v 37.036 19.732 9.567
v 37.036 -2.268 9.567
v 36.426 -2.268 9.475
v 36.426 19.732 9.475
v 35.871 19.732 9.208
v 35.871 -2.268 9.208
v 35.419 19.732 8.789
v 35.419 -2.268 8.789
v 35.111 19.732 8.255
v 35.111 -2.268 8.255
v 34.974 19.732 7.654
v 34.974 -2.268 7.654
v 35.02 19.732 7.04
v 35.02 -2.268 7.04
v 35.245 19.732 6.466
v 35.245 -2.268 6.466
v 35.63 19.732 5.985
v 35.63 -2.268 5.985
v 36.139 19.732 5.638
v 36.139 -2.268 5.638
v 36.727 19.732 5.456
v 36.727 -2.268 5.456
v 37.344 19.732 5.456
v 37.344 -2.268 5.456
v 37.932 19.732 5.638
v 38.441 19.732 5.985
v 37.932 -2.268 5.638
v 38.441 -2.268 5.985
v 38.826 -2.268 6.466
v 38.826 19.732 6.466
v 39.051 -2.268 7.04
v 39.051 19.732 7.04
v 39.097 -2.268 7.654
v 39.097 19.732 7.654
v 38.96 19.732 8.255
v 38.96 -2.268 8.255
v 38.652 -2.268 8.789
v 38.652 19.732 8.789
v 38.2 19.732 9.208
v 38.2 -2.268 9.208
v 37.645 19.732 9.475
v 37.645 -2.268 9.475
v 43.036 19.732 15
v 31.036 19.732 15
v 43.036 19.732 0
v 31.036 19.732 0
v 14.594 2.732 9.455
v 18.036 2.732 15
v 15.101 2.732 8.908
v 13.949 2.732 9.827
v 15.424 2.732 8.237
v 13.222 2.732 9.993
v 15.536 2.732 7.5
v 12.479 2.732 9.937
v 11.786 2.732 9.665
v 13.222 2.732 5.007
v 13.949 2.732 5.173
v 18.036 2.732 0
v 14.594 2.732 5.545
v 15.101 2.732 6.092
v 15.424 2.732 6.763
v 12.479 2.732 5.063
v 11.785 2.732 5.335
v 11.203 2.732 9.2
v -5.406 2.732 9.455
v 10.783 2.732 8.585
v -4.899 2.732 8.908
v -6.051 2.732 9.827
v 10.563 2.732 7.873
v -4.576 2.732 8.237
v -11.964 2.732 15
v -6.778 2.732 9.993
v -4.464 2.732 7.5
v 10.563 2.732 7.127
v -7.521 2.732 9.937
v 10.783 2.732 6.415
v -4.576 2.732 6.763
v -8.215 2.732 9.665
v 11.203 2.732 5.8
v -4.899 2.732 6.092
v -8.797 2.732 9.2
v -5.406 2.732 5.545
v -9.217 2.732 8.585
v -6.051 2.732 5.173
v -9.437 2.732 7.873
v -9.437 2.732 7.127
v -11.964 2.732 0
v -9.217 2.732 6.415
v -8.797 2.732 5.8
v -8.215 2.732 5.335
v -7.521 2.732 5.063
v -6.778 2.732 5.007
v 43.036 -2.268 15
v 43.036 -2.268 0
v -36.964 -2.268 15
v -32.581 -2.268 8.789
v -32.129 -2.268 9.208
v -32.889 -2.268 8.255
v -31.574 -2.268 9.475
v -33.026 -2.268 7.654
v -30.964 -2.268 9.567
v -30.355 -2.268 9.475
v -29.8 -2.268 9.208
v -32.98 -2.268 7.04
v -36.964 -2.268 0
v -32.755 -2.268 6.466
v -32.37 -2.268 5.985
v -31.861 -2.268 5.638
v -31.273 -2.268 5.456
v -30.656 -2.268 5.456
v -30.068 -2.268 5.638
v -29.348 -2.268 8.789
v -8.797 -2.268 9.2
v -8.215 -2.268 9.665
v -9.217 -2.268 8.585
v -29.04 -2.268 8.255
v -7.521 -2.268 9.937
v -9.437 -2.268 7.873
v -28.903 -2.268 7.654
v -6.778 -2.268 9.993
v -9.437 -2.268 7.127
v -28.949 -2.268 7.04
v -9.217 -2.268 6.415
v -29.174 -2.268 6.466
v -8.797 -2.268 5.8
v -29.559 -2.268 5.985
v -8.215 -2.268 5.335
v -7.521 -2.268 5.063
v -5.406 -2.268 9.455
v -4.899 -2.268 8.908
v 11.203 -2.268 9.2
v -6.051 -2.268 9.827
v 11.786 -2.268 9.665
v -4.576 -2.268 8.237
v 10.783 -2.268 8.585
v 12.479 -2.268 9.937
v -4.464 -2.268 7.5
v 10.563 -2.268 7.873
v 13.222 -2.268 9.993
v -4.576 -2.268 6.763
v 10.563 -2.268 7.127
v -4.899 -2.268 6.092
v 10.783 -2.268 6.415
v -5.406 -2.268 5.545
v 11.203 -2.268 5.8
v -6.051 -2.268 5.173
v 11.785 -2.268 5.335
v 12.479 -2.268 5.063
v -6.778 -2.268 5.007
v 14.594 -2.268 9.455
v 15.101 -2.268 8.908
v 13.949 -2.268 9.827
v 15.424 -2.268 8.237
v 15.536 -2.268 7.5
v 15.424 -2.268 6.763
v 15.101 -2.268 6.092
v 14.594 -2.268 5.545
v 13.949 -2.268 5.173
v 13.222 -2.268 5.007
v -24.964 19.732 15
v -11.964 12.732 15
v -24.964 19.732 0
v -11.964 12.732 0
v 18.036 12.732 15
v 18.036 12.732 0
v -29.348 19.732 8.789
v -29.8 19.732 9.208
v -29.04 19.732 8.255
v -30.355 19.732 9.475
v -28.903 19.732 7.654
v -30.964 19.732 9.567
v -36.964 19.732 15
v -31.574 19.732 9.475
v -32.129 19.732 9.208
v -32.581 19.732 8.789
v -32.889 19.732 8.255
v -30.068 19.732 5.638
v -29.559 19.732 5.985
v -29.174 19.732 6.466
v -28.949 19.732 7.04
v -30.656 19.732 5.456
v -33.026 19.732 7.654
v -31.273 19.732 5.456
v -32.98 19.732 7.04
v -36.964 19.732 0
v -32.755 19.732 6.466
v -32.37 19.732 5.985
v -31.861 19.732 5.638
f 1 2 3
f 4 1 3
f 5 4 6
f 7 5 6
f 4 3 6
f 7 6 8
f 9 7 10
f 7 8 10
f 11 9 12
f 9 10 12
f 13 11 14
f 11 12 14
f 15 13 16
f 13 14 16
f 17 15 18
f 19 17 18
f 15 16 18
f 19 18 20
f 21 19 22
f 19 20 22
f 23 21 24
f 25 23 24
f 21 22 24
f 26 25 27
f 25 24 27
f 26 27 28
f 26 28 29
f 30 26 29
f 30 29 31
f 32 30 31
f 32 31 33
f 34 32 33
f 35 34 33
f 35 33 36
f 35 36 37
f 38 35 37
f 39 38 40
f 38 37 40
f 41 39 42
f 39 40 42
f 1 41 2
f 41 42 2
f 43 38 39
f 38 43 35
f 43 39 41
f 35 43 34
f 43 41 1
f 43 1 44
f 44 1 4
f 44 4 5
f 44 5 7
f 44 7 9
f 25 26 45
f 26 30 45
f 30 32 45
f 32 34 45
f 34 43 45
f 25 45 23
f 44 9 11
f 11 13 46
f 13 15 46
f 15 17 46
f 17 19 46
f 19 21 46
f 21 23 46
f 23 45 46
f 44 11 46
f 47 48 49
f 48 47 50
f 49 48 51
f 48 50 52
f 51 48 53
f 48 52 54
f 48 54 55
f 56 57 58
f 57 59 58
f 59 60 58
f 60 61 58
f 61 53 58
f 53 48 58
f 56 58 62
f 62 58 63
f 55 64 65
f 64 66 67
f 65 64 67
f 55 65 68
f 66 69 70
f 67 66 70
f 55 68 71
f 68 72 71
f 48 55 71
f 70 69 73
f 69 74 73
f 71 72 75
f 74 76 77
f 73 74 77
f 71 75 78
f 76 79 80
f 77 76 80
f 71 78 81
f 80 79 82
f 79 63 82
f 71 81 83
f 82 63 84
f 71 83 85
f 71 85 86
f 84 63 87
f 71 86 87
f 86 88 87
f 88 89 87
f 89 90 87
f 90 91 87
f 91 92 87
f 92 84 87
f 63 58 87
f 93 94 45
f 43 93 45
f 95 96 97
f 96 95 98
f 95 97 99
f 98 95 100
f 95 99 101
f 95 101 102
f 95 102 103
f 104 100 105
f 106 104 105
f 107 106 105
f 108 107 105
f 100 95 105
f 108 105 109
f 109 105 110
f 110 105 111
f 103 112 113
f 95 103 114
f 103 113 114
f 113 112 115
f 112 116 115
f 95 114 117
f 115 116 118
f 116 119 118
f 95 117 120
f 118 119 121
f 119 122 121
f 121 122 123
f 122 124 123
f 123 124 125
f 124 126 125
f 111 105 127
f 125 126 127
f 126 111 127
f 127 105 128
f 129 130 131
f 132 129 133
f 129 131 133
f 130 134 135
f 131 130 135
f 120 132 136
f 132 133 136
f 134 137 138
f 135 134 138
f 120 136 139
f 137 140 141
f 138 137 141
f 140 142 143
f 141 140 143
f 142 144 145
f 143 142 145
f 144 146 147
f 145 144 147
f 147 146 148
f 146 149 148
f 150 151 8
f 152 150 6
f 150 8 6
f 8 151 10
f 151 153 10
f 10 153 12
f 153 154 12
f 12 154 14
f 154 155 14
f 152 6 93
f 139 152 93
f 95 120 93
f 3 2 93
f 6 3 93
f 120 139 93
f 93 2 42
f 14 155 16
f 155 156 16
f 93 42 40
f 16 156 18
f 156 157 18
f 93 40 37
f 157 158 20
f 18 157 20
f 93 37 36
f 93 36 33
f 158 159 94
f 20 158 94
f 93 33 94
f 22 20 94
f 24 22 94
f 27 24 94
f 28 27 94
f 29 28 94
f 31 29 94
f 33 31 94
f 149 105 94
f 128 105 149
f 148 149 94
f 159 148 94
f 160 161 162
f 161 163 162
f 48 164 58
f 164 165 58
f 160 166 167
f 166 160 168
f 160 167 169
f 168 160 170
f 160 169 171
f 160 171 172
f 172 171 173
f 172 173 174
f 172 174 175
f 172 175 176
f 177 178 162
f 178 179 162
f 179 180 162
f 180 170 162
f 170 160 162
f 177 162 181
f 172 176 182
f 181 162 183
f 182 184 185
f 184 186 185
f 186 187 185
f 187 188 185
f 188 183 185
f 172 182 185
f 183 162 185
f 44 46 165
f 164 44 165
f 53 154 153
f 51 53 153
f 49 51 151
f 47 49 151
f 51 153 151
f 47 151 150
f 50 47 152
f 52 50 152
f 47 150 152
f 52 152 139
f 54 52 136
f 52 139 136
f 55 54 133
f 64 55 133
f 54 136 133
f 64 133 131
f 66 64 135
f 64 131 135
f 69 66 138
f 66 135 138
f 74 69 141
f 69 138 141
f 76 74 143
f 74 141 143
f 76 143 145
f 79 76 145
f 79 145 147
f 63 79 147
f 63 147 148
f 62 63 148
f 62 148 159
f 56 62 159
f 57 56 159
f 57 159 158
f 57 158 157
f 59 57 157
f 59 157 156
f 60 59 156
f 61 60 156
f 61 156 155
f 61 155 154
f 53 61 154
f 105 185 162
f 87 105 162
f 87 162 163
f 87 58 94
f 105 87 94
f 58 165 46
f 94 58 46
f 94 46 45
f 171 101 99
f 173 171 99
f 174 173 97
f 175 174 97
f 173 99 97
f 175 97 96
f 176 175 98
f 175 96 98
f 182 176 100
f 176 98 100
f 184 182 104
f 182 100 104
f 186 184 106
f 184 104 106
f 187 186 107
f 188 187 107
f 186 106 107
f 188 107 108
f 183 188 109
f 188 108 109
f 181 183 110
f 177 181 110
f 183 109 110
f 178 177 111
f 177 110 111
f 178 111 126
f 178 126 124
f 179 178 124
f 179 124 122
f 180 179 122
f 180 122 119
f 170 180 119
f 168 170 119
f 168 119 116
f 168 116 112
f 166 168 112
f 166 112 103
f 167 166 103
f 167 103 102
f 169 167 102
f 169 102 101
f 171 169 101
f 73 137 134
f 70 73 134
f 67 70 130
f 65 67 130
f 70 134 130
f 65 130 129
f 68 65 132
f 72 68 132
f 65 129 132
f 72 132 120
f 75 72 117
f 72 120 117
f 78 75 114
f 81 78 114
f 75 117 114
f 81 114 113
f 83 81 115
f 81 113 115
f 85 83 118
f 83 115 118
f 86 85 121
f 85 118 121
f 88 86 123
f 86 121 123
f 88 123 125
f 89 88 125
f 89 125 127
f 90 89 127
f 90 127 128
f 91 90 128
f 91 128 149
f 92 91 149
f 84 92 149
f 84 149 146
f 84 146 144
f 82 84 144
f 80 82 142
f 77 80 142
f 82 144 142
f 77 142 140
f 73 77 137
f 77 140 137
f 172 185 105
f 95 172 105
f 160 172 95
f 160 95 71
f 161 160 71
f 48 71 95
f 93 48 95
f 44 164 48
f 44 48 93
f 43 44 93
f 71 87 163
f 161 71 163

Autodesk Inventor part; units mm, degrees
ref_plane "YZ Plane" through (0, 0, 0) normal (1, 0, 0) x (0, 1, 0)
ref_plane "XZ Plane" through (0, 0, 0) normal (0, 1, 0) x (-1, 0, 0)
ref_plane "XY Plane" through (0, 0, 0) normal (0, 0, 1) x (1, 0, 0)
sketch "Sketch1" plane through (0, 0, 0) normal (0, 0, 1) x (1, 0, 0)
  line L0 (-36.9645, 19.732) -> (-36.9645, -2.268)
  line L1 (-36.9645, -2.268) -> (43.0355, -2.268)
  line L2 (43.0355, -2.268) -> (43.0355, 19.732)
  line L3 (43.0355, 19.732) -> (31.0355, 19.732)
  line L4 (31.0355, 19.732) -> (18.0355, 12.732)
  line L5 (18.0355, 12.732) -> (18.0355, 2.732)
  line L6 (18.0355, 2.732) -> (-11.9645, 2.732)
  line L7 (-11.9645, 2.732) -> (-11.9645, 12.732)
  line L8 (-11.9645, 12.732) -> (-24.9645, 19.732)
  line L9 (-24.9645, 19.732) -> (-36.9645, 19.732)
  dimension "d0" = 22
  dimension "d1" = 80
  dimension "d2" = 90
  dimension "d3" = 12
  dimension "d4" = 90
  dimension "d5" = 12
  dimension "d6" = 25
  dimension "d7" = 55
  dimension "d8" = 22
  dimension "d9" = 15
  dimension "d10" = 15
  dimension "d11" = 5
extrude "Extrusion1" add sketch "Sketch1" along normal blind 15
sketch "Sketch2" plane through (-36.9645, -2.268, 0) normal (0, -1, 0) x (1, 0, 0)
  line L0 (80, 15) -> (0, 15) projected
  line L1 (0, 0) -> (0, 15) projected
  circle A0 centre (30, 7.5) radius 2.5
  circle A1 centre (50, 7.5) radius 2.5
  point P0 (36.9645, 0)
  dimension "d14" = 5
  dimension "d17" = 20
  dimension "d22" = 30
  dimension "d23" = 7.5
extrude "Extrusion2" cut sketch "Sketch2" against normal through all
sketch "Sketch3" plane through (-36.9645, 19.732, 0) normal (0, 1, 0) x (1, 0, 0)
  line L0 (12, 0) -> (0, 0) projected
  line L1 (0, 0) -> (0, -15) projected
  line L2 (68, -15) -> (80, -15) projected
  line L3 (80, 0) -> (80, -15) projected
  line L4 (80, 0) -> (68, 0) projected
  line L5 (68, 0) -> (68, -15) projected
  circle A0 centre (6, -7.5) radius 2.5
  circle A1 centre (74, -7.5) radius 2.5
  point P0 (36.9645, 0)
  dimension "d26" = 5
  dimension "d27" = 7.5
  dimension "d28" = 6
  dimension "d29" = 5
  dimension "d30" = 6
  dimension "d31" = 7.5
hole "Hole1" at (-30.9645, 19.732, 7.5) at (37.0355, 19.732, 7.5) direction (0, -1, 0) diameter 4.134 end through all thread size "M5x0.8" class "6H" standard "ANSI Metric M Profile"
equation "\"d8\" = d0"
equation "\"d31\" = d27"
properties part number "SM-TM1" material "Aluminum-6061"
